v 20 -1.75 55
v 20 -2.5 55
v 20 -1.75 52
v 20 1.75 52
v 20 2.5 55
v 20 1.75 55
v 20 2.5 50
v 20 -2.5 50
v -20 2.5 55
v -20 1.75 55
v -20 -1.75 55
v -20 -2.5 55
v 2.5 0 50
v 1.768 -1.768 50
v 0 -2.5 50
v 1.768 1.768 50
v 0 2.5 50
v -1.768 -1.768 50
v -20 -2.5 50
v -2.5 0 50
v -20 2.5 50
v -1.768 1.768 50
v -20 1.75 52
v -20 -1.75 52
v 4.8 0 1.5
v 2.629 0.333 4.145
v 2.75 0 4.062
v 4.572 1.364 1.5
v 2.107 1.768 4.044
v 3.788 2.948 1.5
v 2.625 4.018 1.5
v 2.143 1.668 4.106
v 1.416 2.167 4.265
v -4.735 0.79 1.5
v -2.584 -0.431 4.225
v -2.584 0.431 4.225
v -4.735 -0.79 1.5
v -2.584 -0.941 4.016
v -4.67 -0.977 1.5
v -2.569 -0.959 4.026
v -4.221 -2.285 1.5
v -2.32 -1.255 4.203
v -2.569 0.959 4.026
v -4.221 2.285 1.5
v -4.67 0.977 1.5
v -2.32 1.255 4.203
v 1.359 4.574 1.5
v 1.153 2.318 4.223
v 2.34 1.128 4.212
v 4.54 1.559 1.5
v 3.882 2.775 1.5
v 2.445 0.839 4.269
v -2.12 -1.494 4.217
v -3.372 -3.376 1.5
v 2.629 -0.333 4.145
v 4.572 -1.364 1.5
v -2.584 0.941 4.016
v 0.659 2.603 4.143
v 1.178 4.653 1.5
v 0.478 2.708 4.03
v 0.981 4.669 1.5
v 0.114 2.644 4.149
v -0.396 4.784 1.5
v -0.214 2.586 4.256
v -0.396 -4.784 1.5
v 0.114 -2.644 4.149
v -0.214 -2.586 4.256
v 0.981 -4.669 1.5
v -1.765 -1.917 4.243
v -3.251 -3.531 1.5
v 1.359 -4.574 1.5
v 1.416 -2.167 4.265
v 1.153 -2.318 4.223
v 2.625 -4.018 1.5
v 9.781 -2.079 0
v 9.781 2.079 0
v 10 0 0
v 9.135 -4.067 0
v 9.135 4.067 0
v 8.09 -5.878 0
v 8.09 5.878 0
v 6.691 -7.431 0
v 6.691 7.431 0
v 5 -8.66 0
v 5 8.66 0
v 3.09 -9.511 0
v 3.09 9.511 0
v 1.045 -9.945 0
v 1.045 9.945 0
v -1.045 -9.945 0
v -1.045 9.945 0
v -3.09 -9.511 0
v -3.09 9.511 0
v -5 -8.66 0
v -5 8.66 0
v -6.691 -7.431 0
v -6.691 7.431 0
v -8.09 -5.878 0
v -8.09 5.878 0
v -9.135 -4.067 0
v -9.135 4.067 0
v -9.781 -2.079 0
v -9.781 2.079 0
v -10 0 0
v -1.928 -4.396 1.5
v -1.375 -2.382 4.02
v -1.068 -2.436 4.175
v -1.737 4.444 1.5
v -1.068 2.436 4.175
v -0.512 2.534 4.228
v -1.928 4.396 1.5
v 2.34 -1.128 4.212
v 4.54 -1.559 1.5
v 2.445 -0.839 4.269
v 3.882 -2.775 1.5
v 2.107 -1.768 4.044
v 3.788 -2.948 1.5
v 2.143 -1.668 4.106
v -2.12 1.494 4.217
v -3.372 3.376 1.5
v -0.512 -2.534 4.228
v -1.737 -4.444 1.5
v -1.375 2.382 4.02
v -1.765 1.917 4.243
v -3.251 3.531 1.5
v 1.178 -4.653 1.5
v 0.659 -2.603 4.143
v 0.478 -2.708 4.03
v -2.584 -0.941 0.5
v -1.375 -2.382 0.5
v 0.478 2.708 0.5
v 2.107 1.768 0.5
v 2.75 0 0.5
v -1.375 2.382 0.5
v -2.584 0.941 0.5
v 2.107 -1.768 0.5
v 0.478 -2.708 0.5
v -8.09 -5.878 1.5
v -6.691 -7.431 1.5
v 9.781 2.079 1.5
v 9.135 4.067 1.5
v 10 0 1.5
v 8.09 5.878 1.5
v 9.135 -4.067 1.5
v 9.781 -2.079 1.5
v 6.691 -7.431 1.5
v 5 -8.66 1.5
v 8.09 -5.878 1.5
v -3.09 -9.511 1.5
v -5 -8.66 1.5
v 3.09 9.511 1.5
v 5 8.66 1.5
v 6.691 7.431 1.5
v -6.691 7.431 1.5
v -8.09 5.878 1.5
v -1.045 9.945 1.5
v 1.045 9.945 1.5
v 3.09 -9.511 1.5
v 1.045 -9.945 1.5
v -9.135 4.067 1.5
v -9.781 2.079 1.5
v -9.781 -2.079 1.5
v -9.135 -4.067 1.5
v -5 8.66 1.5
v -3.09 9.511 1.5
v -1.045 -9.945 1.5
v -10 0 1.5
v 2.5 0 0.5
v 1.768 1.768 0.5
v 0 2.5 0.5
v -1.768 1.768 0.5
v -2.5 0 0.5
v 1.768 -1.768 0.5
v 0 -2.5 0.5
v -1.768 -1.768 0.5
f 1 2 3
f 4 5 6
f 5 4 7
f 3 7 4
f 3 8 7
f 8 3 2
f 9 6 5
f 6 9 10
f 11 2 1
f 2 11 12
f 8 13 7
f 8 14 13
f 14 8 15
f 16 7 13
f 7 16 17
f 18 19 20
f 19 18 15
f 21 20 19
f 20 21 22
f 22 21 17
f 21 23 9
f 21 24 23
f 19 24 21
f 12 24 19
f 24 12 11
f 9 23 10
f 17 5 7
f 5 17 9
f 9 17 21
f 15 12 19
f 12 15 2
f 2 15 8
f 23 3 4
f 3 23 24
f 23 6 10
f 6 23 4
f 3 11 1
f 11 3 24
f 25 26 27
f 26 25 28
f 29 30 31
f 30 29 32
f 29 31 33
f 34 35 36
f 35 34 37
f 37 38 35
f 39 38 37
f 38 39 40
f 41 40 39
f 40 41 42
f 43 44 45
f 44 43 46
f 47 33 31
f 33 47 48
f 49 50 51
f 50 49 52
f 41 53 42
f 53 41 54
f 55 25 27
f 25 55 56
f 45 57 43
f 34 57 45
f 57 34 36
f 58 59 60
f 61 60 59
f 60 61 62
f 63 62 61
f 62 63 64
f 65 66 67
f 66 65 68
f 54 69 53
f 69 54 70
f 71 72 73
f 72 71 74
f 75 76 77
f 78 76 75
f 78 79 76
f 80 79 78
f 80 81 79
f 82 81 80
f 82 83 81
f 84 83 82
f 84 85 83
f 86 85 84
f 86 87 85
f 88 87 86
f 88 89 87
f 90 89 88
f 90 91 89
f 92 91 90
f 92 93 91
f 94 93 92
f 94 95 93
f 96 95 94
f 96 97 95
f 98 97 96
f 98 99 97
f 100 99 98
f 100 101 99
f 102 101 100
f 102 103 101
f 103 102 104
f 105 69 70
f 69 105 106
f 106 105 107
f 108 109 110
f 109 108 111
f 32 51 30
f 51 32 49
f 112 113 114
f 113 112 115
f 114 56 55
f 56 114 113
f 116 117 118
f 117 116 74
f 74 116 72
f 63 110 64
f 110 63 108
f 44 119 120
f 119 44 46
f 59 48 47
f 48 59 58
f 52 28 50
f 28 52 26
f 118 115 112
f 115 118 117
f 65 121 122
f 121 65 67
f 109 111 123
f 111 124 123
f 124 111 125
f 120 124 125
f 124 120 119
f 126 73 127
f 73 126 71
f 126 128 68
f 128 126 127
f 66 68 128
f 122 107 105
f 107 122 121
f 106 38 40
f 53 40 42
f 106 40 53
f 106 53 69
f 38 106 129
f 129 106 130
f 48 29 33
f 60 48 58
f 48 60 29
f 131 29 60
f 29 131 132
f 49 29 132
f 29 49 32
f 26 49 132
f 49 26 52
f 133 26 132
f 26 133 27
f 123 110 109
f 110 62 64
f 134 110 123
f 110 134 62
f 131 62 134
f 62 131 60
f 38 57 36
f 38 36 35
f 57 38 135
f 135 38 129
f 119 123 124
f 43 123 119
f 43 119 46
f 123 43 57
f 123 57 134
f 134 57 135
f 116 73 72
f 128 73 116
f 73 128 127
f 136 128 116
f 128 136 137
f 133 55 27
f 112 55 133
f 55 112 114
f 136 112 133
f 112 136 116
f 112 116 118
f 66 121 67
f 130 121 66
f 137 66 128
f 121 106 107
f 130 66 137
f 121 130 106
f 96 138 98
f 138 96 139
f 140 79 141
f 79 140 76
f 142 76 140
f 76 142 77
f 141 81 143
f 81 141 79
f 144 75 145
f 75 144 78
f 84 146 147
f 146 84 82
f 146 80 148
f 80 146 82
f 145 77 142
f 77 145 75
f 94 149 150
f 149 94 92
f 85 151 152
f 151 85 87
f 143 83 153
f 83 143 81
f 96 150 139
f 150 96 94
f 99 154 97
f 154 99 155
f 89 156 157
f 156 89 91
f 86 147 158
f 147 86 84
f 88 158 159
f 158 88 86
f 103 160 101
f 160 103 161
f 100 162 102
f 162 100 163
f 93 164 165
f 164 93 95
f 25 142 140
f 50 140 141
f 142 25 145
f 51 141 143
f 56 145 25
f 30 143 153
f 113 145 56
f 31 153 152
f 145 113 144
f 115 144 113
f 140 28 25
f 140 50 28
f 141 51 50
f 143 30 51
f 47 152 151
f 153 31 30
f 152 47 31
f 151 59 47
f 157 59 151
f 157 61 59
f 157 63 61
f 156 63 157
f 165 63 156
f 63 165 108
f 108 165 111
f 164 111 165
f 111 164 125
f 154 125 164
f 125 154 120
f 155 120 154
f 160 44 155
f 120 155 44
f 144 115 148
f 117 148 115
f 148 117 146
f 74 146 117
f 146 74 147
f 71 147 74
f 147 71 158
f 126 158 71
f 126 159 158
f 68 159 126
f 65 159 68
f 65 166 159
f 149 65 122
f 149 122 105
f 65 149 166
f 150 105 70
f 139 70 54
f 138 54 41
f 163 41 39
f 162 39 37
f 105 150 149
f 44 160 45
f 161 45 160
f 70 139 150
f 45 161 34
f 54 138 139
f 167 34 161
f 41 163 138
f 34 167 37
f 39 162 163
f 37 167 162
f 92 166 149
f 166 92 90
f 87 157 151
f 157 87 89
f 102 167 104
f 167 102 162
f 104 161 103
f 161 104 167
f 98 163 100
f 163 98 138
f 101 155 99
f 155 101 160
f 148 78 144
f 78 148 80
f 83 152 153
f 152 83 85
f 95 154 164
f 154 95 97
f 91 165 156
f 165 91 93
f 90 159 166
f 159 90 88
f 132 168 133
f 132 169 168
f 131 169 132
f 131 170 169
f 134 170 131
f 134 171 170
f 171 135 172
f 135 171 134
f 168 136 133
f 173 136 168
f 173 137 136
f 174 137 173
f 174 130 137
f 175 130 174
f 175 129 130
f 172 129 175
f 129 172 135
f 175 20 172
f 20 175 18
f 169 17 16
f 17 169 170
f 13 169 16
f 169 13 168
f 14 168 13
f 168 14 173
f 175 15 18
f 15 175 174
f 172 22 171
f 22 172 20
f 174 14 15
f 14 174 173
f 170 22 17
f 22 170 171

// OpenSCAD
stemHeight=50;

// Main post
cylinder(h=stemHeight, d=5);

// Wifi Code Holder (box)
difference() {
    translate([-20, -2.5, stemHeight])
    cube([40, 5, 5]);
    translate([-20, -1.75, stemHeight + 2])
    cube([40, 3.5, 3.5]);
}

//Bottom plate brace
difference() {
    cylinder(h=5, r1=6, r2=2);
    cylinder(h=5, d=5.5);
}

//Bottom plate
difference() {
    cylinder(h=1.5, d=20);
    translate([0, 0, .5])
    cylinder(h=1, d=7);
}
